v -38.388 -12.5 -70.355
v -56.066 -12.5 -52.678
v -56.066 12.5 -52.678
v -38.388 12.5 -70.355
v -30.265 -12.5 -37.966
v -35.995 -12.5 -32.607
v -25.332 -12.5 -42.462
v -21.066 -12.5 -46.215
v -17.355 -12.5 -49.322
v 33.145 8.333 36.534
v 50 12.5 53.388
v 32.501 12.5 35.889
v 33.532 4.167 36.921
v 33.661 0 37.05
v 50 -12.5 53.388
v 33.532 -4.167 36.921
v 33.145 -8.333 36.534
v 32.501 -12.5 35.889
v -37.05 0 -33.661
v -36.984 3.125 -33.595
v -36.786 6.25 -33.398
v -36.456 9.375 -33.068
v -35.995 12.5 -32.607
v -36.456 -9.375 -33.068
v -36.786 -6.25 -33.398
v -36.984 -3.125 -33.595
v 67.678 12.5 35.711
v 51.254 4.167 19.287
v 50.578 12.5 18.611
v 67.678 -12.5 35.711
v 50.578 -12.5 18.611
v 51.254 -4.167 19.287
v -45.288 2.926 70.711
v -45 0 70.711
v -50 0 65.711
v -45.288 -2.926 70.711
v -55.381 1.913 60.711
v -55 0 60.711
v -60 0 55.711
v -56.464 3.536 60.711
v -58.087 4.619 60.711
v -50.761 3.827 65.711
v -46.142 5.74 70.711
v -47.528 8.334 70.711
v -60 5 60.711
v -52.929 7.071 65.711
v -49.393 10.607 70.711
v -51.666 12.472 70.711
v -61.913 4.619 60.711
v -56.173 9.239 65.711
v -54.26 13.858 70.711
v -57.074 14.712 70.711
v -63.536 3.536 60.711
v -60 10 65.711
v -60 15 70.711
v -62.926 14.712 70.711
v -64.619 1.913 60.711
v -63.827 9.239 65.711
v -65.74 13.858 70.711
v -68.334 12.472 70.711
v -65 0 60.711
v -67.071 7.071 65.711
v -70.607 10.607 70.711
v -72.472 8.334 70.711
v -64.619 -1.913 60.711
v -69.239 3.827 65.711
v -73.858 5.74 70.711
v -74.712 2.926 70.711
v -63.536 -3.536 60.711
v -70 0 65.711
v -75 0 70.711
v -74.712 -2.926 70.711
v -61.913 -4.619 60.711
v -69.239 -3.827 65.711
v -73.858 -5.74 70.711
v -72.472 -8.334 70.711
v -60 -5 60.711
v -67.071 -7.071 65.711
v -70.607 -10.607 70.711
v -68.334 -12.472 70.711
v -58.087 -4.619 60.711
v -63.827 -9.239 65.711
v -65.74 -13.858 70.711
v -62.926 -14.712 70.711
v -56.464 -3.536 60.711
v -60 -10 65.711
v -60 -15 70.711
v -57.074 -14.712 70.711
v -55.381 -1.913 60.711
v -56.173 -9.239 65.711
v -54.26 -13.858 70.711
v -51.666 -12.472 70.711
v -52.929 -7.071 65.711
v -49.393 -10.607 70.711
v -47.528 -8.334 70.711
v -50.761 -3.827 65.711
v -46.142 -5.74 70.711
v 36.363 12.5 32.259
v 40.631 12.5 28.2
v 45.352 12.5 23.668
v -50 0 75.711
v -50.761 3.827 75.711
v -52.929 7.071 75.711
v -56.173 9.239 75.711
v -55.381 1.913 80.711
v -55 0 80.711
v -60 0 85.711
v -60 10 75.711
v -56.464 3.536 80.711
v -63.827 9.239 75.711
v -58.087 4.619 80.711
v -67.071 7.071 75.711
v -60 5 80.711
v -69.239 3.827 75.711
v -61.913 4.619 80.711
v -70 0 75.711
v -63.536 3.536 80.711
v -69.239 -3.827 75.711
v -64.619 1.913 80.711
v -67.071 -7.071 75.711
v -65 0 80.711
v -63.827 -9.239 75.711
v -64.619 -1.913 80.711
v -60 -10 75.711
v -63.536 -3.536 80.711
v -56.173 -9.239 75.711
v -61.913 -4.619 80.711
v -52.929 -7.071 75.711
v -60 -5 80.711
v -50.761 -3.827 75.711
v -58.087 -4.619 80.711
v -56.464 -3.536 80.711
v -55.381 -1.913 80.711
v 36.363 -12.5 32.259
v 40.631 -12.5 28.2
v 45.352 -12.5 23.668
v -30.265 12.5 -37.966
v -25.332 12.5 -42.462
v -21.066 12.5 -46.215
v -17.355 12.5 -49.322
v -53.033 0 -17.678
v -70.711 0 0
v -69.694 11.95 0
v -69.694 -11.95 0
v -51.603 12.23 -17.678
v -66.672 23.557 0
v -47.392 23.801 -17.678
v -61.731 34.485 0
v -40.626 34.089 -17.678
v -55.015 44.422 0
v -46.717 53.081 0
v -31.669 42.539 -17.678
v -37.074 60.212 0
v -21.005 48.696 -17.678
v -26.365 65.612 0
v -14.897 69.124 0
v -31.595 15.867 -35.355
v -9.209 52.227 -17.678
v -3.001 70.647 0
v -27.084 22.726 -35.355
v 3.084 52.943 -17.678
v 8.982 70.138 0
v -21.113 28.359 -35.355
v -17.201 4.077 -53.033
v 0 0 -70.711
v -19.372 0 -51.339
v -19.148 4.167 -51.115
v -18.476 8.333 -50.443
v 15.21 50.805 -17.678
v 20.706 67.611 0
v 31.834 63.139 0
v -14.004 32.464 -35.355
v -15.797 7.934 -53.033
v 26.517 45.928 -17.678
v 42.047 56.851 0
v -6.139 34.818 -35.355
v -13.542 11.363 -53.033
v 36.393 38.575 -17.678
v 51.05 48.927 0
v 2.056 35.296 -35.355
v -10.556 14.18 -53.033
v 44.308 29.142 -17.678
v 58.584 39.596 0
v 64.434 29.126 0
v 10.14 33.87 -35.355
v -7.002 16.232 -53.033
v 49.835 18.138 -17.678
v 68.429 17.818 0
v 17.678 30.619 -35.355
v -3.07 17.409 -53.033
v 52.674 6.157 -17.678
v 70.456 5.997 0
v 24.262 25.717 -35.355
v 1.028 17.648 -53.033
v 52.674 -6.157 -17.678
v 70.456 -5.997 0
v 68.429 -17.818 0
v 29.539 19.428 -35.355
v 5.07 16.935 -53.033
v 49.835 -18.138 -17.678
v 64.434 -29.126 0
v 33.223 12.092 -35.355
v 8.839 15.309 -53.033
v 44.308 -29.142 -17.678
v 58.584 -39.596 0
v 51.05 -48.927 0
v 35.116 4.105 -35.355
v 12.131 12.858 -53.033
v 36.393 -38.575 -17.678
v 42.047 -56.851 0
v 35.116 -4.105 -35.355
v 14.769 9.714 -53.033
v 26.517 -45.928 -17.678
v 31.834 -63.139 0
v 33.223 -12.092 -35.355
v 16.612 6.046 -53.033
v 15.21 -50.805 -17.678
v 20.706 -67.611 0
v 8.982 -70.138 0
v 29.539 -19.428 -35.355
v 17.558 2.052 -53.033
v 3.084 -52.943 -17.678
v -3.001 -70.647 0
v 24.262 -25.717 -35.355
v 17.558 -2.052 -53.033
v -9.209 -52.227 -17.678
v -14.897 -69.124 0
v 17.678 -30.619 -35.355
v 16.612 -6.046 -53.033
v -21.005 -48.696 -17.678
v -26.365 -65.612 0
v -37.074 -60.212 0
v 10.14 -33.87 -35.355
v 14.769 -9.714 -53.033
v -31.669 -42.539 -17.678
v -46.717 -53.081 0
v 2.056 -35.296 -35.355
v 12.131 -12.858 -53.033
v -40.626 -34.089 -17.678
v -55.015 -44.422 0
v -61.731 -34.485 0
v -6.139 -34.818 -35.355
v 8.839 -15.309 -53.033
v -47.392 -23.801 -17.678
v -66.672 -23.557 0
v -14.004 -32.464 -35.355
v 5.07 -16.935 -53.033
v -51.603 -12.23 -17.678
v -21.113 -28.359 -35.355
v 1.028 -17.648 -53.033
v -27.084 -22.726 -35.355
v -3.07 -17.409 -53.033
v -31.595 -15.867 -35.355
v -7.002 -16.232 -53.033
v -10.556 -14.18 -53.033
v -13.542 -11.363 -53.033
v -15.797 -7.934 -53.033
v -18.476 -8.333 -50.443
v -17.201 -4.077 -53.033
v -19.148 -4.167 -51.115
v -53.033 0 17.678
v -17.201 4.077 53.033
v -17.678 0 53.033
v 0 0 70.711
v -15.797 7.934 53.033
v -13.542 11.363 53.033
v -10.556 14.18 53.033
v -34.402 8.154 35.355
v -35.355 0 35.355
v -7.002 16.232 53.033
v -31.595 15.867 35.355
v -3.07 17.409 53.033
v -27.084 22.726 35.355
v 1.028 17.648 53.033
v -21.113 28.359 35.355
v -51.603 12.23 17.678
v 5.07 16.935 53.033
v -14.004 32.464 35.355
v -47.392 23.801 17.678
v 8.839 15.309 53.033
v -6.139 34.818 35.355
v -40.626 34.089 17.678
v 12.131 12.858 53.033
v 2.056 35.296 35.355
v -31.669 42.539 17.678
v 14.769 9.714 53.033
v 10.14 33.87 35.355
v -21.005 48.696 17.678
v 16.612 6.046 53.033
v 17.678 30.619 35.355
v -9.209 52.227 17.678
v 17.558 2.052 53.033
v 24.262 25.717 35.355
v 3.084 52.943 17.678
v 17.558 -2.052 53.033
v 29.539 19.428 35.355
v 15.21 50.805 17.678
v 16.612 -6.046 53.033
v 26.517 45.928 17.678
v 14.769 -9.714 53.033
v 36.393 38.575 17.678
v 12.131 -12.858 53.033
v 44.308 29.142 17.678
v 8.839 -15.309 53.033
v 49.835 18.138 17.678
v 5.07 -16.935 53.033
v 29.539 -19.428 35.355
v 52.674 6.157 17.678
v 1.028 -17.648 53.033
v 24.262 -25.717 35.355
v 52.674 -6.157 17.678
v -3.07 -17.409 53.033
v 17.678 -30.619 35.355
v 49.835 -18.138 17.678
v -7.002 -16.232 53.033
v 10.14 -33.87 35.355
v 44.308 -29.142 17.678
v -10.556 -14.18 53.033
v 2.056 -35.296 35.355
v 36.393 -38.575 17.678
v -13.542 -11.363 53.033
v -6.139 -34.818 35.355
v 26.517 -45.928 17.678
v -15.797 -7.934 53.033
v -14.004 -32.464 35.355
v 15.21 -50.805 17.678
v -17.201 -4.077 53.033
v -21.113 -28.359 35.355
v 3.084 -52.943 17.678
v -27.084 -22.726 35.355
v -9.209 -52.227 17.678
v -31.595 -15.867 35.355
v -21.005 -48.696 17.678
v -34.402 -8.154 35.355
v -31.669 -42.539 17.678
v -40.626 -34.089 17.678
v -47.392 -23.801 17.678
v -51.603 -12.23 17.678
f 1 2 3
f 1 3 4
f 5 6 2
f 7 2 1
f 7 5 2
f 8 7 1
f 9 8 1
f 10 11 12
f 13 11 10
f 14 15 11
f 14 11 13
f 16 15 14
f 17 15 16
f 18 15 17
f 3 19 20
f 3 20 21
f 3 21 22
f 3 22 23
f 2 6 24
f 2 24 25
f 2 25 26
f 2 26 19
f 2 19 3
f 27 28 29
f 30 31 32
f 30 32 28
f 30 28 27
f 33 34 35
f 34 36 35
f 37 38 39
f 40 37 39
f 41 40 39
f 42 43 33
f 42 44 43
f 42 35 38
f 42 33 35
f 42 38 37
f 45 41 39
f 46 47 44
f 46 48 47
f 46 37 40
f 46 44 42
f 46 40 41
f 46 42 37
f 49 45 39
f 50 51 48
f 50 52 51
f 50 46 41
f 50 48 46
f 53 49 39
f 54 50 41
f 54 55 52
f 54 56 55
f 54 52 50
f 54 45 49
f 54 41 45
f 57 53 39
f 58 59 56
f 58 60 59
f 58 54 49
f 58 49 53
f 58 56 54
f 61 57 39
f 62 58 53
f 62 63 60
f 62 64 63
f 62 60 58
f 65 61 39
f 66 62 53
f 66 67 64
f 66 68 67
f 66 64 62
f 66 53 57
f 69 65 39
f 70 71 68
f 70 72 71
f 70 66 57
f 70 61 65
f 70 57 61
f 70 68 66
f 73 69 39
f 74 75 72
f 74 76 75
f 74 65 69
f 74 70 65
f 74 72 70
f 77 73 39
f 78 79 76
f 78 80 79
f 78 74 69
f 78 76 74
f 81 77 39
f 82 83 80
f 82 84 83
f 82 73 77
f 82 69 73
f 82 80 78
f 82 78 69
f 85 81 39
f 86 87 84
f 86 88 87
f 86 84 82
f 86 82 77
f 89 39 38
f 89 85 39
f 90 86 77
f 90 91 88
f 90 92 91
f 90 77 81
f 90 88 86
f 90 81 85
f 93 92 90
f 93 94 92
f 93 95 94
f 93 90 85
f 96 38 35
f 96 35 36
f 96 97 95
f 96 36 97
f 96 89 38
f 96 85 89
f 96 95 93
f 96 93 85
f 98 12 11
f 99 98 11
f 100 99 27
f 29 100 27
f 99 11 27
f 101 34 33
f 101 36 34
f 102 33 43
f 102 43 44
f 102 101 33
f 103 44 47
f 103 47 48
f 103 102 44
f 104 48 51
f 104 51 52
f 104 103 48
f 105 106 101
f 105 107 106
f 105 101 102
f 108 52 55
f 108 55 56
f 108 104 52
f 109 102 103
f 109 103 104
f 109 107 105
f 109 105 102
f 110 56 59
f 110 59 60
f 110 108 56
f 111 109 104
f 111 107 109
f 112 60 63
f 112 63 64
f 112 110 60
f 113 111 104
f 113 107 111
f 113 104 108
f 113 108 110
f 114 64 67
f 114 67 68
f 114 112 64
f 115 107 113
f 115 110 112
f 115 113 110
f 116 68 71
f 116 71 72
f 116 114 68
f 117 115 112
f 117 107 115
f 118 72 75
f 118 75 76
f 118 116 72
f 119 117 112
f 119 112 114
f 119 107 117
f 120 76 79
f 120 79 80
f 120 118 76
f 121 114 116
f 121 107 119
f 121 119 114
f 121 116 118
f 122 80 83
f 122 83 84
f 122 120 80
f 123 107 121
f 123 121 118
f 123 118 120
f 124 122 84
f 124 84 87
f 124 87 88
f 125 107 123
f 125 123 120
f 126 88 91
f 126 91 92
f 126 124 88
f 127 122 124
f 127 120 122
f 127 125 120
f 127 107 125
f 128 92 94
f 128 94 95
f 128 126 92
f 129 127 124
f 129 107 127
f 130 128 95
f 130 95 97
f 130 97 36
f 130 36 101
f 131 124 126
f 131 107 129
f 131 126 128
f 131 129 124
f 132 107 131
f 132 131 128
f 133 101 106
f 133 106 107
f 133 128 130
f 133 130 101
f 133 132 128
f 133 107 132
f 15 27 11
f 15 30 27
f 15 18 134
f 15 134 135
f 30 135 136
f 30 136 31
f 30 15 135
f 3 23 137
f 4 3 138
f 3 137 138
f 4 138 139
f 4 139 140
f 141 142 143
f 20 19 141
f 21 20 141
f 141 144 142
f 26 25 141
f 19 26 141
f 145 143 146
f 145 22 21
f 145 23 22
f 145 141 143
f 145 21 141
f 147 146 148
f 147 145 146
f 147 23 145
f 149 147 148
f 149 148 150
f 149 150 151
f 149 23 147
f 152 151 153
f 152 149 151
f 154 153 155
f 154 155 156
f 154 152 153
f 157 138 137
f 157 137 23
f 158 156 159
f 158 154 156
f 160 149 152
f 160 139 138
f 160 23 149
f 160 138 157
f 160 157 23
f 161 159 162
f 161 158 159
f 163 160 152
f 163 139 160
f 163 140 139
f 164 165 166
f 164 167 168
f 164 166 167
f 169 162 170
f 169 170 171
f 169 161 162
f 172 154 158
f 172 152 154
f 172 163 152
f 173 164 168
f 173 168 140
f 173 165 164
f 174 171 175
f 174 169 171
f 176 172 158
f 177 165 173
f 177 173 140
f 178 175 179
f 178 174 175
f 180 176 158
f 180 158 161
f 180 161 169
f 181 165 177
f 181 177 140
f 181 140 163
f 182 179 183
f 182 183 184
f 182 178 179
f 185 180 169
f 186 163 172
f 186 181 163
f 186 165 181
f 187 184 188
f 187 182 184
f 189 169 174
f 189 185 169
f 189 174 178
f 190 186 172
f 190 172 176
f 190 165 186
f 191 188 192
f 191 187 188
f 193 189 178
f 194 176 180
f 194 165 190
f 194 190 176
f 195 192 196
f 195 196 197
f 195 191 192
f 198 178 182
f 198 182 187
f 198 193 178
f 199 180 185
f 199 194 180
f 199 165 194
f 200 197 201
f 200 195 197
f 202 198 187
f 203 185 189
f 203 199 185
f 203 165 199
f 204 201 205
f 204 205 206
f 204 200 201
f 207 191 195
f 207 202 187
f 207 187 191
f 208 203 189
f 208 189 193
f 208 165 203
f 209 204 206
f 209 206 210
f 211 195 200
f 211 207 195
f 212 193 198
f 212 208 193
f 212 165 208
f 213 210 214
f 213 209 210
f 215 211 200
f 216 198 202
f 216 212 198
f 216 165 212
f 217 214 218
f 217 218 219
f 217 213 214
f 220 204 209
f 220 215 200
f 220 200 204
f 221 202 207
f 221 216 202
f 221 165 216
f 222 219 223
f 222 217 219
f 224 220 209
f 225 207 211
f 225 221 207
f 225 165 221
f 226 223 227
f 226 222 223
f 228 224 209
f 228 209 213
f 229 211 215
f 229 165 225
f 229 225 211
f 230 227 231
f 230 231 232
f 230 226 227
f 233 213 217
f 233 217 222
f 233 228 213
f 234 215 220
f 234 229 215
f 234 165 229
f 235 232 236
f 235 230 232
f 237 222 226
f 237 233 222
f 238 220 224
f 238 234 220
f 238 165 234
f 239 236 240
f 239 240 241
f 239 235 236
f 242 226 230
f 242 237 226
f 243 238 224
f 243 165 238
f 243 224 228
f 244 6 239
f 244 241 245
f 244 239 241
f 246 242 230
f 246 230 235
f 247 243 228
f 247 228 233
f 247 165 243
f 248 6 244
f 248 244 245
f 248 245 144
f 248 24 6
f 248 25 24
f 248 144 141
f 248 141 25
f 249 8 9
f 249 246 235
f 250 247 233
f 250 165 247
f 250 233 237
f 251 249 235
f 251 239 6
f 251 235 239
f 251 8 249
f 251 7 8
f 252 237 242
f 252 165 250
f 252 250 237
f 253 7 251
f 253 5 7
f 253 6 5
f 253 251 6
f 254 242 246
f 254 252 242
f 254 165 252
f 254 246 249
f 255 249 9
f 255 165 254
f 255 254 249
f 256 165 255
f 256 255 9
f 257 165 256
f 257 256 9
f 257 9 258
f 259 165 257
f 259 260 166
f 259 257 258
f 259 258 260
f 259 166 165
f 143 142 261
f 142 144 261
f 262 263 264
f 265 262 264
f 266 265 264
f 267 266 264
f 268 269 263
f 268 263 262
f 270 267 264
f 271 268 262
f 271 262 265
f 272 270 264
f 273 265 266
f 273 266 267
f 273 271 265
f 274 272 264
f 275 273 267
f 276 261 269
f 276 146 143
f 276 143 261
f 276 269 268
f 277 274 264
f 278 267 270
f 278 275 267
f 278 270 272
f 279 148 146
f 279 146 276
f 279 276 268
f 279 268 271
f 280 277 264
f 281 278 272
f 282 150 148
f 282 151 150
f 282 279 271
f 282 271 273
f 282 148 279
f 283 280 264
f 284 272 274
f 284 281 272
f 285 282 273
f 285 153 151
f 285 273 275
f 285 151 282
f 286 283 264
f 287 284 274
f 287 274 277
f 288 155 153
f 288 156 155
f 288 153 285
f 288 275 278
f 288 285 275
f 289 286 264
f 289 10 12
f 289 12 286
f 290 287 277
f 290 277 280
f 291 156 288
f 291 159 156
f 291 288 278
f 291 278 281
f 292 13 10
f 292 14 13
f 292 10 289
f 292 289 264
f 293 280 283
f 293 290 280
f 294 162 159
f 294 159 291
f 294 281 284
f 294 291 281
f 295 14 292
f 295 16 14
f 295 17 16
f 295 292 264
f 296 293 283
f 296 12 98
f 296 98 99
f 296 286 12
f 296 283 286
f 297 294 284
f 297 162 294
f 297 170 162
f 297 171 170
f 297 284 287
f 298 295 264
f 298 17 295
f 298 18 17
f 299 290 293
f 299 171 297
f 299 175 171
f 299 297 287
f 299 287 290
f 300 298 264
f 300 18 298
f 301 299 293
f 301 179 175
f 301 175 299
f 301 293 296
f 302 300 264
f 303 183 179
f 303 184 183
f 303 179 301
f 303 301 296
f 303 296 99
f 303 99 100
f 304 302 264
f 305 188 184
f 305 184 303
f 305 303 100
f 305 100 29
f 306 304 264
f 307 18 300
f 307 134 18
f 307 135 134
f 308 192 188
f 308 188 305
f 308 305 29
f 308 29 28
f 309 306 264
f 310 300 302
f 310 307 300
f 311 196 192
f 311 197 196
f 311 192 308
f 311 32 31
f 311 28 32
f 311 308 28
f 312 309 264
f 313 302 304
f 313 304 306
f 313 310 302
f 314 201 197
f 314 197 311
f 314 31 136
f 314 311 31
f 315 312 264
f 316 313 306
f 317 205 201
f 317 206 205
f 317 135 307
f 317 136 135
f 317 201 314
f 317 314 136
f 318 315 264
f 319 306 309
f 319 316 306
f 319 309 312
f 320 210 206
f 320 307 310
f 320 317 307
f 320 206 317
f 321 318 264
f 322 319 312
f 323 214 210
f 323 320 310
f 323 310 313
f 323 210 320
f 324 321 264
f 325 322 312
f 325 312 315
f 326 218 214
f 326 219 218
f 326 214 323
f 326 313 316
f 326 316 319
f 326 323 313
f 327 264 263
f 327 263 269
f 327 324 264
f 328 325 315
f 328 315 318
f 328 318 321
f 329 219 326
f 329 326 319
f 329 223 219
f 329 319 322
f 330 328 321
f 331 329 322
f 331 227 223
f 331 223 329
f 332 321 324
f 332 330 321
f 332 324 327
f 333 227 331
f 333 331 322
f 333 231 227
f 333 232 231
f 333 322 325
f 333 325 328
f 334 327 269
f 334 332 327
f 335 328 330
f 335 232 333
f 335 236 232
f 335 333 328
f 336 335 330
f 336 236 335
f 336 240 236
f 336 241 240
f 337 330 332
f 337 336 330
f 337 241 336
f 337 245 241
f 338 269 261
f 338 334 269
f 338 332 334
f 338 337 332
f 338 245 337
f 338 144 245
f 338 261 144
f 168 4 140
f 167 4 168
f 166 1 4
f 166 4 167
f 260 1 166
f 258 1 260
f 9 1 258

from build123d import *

# Parameters (mm, degrees)
F5_DEPTH = 12.5


with BuildPart() as f1:
    # F0 (on Front) → F1 (revolve)
    with BuildSketch(Plane.XZ):
        Polygon((0, -70.7106781187), (0, 70.7106781187), (-70.7106781187, 0), align=None)
    revolve(axis=Axis((0, 0, -1.1759153851), (0, 0, -1)))

    # F4 (on Front) → F5 (join, symmetric)
    with BuildSketch(Plane.XZ):
        Polygon((67.6776695297, 35.7106781187), (50, 53.3883476483), (-56.066017178, -52.6776695297), (-38.3883476483, -70.3553390593), align=None)
    extrude(amount=F5_DEPTH, both=True)


with BuildPart() as f3:
    # F2 (on Front) → F3 (revolve)
    with BuildSketch(Plane.XZ):
        Polygon((-60, 55.7106781187), (-45, 70.7106781187), (-60, 85.7106781187), align=None)
    revolve(axis=Axis((-60, 0, 69.1770929843), (0, 0, 1)))


solid = Compound([f1.part, f3.part])
